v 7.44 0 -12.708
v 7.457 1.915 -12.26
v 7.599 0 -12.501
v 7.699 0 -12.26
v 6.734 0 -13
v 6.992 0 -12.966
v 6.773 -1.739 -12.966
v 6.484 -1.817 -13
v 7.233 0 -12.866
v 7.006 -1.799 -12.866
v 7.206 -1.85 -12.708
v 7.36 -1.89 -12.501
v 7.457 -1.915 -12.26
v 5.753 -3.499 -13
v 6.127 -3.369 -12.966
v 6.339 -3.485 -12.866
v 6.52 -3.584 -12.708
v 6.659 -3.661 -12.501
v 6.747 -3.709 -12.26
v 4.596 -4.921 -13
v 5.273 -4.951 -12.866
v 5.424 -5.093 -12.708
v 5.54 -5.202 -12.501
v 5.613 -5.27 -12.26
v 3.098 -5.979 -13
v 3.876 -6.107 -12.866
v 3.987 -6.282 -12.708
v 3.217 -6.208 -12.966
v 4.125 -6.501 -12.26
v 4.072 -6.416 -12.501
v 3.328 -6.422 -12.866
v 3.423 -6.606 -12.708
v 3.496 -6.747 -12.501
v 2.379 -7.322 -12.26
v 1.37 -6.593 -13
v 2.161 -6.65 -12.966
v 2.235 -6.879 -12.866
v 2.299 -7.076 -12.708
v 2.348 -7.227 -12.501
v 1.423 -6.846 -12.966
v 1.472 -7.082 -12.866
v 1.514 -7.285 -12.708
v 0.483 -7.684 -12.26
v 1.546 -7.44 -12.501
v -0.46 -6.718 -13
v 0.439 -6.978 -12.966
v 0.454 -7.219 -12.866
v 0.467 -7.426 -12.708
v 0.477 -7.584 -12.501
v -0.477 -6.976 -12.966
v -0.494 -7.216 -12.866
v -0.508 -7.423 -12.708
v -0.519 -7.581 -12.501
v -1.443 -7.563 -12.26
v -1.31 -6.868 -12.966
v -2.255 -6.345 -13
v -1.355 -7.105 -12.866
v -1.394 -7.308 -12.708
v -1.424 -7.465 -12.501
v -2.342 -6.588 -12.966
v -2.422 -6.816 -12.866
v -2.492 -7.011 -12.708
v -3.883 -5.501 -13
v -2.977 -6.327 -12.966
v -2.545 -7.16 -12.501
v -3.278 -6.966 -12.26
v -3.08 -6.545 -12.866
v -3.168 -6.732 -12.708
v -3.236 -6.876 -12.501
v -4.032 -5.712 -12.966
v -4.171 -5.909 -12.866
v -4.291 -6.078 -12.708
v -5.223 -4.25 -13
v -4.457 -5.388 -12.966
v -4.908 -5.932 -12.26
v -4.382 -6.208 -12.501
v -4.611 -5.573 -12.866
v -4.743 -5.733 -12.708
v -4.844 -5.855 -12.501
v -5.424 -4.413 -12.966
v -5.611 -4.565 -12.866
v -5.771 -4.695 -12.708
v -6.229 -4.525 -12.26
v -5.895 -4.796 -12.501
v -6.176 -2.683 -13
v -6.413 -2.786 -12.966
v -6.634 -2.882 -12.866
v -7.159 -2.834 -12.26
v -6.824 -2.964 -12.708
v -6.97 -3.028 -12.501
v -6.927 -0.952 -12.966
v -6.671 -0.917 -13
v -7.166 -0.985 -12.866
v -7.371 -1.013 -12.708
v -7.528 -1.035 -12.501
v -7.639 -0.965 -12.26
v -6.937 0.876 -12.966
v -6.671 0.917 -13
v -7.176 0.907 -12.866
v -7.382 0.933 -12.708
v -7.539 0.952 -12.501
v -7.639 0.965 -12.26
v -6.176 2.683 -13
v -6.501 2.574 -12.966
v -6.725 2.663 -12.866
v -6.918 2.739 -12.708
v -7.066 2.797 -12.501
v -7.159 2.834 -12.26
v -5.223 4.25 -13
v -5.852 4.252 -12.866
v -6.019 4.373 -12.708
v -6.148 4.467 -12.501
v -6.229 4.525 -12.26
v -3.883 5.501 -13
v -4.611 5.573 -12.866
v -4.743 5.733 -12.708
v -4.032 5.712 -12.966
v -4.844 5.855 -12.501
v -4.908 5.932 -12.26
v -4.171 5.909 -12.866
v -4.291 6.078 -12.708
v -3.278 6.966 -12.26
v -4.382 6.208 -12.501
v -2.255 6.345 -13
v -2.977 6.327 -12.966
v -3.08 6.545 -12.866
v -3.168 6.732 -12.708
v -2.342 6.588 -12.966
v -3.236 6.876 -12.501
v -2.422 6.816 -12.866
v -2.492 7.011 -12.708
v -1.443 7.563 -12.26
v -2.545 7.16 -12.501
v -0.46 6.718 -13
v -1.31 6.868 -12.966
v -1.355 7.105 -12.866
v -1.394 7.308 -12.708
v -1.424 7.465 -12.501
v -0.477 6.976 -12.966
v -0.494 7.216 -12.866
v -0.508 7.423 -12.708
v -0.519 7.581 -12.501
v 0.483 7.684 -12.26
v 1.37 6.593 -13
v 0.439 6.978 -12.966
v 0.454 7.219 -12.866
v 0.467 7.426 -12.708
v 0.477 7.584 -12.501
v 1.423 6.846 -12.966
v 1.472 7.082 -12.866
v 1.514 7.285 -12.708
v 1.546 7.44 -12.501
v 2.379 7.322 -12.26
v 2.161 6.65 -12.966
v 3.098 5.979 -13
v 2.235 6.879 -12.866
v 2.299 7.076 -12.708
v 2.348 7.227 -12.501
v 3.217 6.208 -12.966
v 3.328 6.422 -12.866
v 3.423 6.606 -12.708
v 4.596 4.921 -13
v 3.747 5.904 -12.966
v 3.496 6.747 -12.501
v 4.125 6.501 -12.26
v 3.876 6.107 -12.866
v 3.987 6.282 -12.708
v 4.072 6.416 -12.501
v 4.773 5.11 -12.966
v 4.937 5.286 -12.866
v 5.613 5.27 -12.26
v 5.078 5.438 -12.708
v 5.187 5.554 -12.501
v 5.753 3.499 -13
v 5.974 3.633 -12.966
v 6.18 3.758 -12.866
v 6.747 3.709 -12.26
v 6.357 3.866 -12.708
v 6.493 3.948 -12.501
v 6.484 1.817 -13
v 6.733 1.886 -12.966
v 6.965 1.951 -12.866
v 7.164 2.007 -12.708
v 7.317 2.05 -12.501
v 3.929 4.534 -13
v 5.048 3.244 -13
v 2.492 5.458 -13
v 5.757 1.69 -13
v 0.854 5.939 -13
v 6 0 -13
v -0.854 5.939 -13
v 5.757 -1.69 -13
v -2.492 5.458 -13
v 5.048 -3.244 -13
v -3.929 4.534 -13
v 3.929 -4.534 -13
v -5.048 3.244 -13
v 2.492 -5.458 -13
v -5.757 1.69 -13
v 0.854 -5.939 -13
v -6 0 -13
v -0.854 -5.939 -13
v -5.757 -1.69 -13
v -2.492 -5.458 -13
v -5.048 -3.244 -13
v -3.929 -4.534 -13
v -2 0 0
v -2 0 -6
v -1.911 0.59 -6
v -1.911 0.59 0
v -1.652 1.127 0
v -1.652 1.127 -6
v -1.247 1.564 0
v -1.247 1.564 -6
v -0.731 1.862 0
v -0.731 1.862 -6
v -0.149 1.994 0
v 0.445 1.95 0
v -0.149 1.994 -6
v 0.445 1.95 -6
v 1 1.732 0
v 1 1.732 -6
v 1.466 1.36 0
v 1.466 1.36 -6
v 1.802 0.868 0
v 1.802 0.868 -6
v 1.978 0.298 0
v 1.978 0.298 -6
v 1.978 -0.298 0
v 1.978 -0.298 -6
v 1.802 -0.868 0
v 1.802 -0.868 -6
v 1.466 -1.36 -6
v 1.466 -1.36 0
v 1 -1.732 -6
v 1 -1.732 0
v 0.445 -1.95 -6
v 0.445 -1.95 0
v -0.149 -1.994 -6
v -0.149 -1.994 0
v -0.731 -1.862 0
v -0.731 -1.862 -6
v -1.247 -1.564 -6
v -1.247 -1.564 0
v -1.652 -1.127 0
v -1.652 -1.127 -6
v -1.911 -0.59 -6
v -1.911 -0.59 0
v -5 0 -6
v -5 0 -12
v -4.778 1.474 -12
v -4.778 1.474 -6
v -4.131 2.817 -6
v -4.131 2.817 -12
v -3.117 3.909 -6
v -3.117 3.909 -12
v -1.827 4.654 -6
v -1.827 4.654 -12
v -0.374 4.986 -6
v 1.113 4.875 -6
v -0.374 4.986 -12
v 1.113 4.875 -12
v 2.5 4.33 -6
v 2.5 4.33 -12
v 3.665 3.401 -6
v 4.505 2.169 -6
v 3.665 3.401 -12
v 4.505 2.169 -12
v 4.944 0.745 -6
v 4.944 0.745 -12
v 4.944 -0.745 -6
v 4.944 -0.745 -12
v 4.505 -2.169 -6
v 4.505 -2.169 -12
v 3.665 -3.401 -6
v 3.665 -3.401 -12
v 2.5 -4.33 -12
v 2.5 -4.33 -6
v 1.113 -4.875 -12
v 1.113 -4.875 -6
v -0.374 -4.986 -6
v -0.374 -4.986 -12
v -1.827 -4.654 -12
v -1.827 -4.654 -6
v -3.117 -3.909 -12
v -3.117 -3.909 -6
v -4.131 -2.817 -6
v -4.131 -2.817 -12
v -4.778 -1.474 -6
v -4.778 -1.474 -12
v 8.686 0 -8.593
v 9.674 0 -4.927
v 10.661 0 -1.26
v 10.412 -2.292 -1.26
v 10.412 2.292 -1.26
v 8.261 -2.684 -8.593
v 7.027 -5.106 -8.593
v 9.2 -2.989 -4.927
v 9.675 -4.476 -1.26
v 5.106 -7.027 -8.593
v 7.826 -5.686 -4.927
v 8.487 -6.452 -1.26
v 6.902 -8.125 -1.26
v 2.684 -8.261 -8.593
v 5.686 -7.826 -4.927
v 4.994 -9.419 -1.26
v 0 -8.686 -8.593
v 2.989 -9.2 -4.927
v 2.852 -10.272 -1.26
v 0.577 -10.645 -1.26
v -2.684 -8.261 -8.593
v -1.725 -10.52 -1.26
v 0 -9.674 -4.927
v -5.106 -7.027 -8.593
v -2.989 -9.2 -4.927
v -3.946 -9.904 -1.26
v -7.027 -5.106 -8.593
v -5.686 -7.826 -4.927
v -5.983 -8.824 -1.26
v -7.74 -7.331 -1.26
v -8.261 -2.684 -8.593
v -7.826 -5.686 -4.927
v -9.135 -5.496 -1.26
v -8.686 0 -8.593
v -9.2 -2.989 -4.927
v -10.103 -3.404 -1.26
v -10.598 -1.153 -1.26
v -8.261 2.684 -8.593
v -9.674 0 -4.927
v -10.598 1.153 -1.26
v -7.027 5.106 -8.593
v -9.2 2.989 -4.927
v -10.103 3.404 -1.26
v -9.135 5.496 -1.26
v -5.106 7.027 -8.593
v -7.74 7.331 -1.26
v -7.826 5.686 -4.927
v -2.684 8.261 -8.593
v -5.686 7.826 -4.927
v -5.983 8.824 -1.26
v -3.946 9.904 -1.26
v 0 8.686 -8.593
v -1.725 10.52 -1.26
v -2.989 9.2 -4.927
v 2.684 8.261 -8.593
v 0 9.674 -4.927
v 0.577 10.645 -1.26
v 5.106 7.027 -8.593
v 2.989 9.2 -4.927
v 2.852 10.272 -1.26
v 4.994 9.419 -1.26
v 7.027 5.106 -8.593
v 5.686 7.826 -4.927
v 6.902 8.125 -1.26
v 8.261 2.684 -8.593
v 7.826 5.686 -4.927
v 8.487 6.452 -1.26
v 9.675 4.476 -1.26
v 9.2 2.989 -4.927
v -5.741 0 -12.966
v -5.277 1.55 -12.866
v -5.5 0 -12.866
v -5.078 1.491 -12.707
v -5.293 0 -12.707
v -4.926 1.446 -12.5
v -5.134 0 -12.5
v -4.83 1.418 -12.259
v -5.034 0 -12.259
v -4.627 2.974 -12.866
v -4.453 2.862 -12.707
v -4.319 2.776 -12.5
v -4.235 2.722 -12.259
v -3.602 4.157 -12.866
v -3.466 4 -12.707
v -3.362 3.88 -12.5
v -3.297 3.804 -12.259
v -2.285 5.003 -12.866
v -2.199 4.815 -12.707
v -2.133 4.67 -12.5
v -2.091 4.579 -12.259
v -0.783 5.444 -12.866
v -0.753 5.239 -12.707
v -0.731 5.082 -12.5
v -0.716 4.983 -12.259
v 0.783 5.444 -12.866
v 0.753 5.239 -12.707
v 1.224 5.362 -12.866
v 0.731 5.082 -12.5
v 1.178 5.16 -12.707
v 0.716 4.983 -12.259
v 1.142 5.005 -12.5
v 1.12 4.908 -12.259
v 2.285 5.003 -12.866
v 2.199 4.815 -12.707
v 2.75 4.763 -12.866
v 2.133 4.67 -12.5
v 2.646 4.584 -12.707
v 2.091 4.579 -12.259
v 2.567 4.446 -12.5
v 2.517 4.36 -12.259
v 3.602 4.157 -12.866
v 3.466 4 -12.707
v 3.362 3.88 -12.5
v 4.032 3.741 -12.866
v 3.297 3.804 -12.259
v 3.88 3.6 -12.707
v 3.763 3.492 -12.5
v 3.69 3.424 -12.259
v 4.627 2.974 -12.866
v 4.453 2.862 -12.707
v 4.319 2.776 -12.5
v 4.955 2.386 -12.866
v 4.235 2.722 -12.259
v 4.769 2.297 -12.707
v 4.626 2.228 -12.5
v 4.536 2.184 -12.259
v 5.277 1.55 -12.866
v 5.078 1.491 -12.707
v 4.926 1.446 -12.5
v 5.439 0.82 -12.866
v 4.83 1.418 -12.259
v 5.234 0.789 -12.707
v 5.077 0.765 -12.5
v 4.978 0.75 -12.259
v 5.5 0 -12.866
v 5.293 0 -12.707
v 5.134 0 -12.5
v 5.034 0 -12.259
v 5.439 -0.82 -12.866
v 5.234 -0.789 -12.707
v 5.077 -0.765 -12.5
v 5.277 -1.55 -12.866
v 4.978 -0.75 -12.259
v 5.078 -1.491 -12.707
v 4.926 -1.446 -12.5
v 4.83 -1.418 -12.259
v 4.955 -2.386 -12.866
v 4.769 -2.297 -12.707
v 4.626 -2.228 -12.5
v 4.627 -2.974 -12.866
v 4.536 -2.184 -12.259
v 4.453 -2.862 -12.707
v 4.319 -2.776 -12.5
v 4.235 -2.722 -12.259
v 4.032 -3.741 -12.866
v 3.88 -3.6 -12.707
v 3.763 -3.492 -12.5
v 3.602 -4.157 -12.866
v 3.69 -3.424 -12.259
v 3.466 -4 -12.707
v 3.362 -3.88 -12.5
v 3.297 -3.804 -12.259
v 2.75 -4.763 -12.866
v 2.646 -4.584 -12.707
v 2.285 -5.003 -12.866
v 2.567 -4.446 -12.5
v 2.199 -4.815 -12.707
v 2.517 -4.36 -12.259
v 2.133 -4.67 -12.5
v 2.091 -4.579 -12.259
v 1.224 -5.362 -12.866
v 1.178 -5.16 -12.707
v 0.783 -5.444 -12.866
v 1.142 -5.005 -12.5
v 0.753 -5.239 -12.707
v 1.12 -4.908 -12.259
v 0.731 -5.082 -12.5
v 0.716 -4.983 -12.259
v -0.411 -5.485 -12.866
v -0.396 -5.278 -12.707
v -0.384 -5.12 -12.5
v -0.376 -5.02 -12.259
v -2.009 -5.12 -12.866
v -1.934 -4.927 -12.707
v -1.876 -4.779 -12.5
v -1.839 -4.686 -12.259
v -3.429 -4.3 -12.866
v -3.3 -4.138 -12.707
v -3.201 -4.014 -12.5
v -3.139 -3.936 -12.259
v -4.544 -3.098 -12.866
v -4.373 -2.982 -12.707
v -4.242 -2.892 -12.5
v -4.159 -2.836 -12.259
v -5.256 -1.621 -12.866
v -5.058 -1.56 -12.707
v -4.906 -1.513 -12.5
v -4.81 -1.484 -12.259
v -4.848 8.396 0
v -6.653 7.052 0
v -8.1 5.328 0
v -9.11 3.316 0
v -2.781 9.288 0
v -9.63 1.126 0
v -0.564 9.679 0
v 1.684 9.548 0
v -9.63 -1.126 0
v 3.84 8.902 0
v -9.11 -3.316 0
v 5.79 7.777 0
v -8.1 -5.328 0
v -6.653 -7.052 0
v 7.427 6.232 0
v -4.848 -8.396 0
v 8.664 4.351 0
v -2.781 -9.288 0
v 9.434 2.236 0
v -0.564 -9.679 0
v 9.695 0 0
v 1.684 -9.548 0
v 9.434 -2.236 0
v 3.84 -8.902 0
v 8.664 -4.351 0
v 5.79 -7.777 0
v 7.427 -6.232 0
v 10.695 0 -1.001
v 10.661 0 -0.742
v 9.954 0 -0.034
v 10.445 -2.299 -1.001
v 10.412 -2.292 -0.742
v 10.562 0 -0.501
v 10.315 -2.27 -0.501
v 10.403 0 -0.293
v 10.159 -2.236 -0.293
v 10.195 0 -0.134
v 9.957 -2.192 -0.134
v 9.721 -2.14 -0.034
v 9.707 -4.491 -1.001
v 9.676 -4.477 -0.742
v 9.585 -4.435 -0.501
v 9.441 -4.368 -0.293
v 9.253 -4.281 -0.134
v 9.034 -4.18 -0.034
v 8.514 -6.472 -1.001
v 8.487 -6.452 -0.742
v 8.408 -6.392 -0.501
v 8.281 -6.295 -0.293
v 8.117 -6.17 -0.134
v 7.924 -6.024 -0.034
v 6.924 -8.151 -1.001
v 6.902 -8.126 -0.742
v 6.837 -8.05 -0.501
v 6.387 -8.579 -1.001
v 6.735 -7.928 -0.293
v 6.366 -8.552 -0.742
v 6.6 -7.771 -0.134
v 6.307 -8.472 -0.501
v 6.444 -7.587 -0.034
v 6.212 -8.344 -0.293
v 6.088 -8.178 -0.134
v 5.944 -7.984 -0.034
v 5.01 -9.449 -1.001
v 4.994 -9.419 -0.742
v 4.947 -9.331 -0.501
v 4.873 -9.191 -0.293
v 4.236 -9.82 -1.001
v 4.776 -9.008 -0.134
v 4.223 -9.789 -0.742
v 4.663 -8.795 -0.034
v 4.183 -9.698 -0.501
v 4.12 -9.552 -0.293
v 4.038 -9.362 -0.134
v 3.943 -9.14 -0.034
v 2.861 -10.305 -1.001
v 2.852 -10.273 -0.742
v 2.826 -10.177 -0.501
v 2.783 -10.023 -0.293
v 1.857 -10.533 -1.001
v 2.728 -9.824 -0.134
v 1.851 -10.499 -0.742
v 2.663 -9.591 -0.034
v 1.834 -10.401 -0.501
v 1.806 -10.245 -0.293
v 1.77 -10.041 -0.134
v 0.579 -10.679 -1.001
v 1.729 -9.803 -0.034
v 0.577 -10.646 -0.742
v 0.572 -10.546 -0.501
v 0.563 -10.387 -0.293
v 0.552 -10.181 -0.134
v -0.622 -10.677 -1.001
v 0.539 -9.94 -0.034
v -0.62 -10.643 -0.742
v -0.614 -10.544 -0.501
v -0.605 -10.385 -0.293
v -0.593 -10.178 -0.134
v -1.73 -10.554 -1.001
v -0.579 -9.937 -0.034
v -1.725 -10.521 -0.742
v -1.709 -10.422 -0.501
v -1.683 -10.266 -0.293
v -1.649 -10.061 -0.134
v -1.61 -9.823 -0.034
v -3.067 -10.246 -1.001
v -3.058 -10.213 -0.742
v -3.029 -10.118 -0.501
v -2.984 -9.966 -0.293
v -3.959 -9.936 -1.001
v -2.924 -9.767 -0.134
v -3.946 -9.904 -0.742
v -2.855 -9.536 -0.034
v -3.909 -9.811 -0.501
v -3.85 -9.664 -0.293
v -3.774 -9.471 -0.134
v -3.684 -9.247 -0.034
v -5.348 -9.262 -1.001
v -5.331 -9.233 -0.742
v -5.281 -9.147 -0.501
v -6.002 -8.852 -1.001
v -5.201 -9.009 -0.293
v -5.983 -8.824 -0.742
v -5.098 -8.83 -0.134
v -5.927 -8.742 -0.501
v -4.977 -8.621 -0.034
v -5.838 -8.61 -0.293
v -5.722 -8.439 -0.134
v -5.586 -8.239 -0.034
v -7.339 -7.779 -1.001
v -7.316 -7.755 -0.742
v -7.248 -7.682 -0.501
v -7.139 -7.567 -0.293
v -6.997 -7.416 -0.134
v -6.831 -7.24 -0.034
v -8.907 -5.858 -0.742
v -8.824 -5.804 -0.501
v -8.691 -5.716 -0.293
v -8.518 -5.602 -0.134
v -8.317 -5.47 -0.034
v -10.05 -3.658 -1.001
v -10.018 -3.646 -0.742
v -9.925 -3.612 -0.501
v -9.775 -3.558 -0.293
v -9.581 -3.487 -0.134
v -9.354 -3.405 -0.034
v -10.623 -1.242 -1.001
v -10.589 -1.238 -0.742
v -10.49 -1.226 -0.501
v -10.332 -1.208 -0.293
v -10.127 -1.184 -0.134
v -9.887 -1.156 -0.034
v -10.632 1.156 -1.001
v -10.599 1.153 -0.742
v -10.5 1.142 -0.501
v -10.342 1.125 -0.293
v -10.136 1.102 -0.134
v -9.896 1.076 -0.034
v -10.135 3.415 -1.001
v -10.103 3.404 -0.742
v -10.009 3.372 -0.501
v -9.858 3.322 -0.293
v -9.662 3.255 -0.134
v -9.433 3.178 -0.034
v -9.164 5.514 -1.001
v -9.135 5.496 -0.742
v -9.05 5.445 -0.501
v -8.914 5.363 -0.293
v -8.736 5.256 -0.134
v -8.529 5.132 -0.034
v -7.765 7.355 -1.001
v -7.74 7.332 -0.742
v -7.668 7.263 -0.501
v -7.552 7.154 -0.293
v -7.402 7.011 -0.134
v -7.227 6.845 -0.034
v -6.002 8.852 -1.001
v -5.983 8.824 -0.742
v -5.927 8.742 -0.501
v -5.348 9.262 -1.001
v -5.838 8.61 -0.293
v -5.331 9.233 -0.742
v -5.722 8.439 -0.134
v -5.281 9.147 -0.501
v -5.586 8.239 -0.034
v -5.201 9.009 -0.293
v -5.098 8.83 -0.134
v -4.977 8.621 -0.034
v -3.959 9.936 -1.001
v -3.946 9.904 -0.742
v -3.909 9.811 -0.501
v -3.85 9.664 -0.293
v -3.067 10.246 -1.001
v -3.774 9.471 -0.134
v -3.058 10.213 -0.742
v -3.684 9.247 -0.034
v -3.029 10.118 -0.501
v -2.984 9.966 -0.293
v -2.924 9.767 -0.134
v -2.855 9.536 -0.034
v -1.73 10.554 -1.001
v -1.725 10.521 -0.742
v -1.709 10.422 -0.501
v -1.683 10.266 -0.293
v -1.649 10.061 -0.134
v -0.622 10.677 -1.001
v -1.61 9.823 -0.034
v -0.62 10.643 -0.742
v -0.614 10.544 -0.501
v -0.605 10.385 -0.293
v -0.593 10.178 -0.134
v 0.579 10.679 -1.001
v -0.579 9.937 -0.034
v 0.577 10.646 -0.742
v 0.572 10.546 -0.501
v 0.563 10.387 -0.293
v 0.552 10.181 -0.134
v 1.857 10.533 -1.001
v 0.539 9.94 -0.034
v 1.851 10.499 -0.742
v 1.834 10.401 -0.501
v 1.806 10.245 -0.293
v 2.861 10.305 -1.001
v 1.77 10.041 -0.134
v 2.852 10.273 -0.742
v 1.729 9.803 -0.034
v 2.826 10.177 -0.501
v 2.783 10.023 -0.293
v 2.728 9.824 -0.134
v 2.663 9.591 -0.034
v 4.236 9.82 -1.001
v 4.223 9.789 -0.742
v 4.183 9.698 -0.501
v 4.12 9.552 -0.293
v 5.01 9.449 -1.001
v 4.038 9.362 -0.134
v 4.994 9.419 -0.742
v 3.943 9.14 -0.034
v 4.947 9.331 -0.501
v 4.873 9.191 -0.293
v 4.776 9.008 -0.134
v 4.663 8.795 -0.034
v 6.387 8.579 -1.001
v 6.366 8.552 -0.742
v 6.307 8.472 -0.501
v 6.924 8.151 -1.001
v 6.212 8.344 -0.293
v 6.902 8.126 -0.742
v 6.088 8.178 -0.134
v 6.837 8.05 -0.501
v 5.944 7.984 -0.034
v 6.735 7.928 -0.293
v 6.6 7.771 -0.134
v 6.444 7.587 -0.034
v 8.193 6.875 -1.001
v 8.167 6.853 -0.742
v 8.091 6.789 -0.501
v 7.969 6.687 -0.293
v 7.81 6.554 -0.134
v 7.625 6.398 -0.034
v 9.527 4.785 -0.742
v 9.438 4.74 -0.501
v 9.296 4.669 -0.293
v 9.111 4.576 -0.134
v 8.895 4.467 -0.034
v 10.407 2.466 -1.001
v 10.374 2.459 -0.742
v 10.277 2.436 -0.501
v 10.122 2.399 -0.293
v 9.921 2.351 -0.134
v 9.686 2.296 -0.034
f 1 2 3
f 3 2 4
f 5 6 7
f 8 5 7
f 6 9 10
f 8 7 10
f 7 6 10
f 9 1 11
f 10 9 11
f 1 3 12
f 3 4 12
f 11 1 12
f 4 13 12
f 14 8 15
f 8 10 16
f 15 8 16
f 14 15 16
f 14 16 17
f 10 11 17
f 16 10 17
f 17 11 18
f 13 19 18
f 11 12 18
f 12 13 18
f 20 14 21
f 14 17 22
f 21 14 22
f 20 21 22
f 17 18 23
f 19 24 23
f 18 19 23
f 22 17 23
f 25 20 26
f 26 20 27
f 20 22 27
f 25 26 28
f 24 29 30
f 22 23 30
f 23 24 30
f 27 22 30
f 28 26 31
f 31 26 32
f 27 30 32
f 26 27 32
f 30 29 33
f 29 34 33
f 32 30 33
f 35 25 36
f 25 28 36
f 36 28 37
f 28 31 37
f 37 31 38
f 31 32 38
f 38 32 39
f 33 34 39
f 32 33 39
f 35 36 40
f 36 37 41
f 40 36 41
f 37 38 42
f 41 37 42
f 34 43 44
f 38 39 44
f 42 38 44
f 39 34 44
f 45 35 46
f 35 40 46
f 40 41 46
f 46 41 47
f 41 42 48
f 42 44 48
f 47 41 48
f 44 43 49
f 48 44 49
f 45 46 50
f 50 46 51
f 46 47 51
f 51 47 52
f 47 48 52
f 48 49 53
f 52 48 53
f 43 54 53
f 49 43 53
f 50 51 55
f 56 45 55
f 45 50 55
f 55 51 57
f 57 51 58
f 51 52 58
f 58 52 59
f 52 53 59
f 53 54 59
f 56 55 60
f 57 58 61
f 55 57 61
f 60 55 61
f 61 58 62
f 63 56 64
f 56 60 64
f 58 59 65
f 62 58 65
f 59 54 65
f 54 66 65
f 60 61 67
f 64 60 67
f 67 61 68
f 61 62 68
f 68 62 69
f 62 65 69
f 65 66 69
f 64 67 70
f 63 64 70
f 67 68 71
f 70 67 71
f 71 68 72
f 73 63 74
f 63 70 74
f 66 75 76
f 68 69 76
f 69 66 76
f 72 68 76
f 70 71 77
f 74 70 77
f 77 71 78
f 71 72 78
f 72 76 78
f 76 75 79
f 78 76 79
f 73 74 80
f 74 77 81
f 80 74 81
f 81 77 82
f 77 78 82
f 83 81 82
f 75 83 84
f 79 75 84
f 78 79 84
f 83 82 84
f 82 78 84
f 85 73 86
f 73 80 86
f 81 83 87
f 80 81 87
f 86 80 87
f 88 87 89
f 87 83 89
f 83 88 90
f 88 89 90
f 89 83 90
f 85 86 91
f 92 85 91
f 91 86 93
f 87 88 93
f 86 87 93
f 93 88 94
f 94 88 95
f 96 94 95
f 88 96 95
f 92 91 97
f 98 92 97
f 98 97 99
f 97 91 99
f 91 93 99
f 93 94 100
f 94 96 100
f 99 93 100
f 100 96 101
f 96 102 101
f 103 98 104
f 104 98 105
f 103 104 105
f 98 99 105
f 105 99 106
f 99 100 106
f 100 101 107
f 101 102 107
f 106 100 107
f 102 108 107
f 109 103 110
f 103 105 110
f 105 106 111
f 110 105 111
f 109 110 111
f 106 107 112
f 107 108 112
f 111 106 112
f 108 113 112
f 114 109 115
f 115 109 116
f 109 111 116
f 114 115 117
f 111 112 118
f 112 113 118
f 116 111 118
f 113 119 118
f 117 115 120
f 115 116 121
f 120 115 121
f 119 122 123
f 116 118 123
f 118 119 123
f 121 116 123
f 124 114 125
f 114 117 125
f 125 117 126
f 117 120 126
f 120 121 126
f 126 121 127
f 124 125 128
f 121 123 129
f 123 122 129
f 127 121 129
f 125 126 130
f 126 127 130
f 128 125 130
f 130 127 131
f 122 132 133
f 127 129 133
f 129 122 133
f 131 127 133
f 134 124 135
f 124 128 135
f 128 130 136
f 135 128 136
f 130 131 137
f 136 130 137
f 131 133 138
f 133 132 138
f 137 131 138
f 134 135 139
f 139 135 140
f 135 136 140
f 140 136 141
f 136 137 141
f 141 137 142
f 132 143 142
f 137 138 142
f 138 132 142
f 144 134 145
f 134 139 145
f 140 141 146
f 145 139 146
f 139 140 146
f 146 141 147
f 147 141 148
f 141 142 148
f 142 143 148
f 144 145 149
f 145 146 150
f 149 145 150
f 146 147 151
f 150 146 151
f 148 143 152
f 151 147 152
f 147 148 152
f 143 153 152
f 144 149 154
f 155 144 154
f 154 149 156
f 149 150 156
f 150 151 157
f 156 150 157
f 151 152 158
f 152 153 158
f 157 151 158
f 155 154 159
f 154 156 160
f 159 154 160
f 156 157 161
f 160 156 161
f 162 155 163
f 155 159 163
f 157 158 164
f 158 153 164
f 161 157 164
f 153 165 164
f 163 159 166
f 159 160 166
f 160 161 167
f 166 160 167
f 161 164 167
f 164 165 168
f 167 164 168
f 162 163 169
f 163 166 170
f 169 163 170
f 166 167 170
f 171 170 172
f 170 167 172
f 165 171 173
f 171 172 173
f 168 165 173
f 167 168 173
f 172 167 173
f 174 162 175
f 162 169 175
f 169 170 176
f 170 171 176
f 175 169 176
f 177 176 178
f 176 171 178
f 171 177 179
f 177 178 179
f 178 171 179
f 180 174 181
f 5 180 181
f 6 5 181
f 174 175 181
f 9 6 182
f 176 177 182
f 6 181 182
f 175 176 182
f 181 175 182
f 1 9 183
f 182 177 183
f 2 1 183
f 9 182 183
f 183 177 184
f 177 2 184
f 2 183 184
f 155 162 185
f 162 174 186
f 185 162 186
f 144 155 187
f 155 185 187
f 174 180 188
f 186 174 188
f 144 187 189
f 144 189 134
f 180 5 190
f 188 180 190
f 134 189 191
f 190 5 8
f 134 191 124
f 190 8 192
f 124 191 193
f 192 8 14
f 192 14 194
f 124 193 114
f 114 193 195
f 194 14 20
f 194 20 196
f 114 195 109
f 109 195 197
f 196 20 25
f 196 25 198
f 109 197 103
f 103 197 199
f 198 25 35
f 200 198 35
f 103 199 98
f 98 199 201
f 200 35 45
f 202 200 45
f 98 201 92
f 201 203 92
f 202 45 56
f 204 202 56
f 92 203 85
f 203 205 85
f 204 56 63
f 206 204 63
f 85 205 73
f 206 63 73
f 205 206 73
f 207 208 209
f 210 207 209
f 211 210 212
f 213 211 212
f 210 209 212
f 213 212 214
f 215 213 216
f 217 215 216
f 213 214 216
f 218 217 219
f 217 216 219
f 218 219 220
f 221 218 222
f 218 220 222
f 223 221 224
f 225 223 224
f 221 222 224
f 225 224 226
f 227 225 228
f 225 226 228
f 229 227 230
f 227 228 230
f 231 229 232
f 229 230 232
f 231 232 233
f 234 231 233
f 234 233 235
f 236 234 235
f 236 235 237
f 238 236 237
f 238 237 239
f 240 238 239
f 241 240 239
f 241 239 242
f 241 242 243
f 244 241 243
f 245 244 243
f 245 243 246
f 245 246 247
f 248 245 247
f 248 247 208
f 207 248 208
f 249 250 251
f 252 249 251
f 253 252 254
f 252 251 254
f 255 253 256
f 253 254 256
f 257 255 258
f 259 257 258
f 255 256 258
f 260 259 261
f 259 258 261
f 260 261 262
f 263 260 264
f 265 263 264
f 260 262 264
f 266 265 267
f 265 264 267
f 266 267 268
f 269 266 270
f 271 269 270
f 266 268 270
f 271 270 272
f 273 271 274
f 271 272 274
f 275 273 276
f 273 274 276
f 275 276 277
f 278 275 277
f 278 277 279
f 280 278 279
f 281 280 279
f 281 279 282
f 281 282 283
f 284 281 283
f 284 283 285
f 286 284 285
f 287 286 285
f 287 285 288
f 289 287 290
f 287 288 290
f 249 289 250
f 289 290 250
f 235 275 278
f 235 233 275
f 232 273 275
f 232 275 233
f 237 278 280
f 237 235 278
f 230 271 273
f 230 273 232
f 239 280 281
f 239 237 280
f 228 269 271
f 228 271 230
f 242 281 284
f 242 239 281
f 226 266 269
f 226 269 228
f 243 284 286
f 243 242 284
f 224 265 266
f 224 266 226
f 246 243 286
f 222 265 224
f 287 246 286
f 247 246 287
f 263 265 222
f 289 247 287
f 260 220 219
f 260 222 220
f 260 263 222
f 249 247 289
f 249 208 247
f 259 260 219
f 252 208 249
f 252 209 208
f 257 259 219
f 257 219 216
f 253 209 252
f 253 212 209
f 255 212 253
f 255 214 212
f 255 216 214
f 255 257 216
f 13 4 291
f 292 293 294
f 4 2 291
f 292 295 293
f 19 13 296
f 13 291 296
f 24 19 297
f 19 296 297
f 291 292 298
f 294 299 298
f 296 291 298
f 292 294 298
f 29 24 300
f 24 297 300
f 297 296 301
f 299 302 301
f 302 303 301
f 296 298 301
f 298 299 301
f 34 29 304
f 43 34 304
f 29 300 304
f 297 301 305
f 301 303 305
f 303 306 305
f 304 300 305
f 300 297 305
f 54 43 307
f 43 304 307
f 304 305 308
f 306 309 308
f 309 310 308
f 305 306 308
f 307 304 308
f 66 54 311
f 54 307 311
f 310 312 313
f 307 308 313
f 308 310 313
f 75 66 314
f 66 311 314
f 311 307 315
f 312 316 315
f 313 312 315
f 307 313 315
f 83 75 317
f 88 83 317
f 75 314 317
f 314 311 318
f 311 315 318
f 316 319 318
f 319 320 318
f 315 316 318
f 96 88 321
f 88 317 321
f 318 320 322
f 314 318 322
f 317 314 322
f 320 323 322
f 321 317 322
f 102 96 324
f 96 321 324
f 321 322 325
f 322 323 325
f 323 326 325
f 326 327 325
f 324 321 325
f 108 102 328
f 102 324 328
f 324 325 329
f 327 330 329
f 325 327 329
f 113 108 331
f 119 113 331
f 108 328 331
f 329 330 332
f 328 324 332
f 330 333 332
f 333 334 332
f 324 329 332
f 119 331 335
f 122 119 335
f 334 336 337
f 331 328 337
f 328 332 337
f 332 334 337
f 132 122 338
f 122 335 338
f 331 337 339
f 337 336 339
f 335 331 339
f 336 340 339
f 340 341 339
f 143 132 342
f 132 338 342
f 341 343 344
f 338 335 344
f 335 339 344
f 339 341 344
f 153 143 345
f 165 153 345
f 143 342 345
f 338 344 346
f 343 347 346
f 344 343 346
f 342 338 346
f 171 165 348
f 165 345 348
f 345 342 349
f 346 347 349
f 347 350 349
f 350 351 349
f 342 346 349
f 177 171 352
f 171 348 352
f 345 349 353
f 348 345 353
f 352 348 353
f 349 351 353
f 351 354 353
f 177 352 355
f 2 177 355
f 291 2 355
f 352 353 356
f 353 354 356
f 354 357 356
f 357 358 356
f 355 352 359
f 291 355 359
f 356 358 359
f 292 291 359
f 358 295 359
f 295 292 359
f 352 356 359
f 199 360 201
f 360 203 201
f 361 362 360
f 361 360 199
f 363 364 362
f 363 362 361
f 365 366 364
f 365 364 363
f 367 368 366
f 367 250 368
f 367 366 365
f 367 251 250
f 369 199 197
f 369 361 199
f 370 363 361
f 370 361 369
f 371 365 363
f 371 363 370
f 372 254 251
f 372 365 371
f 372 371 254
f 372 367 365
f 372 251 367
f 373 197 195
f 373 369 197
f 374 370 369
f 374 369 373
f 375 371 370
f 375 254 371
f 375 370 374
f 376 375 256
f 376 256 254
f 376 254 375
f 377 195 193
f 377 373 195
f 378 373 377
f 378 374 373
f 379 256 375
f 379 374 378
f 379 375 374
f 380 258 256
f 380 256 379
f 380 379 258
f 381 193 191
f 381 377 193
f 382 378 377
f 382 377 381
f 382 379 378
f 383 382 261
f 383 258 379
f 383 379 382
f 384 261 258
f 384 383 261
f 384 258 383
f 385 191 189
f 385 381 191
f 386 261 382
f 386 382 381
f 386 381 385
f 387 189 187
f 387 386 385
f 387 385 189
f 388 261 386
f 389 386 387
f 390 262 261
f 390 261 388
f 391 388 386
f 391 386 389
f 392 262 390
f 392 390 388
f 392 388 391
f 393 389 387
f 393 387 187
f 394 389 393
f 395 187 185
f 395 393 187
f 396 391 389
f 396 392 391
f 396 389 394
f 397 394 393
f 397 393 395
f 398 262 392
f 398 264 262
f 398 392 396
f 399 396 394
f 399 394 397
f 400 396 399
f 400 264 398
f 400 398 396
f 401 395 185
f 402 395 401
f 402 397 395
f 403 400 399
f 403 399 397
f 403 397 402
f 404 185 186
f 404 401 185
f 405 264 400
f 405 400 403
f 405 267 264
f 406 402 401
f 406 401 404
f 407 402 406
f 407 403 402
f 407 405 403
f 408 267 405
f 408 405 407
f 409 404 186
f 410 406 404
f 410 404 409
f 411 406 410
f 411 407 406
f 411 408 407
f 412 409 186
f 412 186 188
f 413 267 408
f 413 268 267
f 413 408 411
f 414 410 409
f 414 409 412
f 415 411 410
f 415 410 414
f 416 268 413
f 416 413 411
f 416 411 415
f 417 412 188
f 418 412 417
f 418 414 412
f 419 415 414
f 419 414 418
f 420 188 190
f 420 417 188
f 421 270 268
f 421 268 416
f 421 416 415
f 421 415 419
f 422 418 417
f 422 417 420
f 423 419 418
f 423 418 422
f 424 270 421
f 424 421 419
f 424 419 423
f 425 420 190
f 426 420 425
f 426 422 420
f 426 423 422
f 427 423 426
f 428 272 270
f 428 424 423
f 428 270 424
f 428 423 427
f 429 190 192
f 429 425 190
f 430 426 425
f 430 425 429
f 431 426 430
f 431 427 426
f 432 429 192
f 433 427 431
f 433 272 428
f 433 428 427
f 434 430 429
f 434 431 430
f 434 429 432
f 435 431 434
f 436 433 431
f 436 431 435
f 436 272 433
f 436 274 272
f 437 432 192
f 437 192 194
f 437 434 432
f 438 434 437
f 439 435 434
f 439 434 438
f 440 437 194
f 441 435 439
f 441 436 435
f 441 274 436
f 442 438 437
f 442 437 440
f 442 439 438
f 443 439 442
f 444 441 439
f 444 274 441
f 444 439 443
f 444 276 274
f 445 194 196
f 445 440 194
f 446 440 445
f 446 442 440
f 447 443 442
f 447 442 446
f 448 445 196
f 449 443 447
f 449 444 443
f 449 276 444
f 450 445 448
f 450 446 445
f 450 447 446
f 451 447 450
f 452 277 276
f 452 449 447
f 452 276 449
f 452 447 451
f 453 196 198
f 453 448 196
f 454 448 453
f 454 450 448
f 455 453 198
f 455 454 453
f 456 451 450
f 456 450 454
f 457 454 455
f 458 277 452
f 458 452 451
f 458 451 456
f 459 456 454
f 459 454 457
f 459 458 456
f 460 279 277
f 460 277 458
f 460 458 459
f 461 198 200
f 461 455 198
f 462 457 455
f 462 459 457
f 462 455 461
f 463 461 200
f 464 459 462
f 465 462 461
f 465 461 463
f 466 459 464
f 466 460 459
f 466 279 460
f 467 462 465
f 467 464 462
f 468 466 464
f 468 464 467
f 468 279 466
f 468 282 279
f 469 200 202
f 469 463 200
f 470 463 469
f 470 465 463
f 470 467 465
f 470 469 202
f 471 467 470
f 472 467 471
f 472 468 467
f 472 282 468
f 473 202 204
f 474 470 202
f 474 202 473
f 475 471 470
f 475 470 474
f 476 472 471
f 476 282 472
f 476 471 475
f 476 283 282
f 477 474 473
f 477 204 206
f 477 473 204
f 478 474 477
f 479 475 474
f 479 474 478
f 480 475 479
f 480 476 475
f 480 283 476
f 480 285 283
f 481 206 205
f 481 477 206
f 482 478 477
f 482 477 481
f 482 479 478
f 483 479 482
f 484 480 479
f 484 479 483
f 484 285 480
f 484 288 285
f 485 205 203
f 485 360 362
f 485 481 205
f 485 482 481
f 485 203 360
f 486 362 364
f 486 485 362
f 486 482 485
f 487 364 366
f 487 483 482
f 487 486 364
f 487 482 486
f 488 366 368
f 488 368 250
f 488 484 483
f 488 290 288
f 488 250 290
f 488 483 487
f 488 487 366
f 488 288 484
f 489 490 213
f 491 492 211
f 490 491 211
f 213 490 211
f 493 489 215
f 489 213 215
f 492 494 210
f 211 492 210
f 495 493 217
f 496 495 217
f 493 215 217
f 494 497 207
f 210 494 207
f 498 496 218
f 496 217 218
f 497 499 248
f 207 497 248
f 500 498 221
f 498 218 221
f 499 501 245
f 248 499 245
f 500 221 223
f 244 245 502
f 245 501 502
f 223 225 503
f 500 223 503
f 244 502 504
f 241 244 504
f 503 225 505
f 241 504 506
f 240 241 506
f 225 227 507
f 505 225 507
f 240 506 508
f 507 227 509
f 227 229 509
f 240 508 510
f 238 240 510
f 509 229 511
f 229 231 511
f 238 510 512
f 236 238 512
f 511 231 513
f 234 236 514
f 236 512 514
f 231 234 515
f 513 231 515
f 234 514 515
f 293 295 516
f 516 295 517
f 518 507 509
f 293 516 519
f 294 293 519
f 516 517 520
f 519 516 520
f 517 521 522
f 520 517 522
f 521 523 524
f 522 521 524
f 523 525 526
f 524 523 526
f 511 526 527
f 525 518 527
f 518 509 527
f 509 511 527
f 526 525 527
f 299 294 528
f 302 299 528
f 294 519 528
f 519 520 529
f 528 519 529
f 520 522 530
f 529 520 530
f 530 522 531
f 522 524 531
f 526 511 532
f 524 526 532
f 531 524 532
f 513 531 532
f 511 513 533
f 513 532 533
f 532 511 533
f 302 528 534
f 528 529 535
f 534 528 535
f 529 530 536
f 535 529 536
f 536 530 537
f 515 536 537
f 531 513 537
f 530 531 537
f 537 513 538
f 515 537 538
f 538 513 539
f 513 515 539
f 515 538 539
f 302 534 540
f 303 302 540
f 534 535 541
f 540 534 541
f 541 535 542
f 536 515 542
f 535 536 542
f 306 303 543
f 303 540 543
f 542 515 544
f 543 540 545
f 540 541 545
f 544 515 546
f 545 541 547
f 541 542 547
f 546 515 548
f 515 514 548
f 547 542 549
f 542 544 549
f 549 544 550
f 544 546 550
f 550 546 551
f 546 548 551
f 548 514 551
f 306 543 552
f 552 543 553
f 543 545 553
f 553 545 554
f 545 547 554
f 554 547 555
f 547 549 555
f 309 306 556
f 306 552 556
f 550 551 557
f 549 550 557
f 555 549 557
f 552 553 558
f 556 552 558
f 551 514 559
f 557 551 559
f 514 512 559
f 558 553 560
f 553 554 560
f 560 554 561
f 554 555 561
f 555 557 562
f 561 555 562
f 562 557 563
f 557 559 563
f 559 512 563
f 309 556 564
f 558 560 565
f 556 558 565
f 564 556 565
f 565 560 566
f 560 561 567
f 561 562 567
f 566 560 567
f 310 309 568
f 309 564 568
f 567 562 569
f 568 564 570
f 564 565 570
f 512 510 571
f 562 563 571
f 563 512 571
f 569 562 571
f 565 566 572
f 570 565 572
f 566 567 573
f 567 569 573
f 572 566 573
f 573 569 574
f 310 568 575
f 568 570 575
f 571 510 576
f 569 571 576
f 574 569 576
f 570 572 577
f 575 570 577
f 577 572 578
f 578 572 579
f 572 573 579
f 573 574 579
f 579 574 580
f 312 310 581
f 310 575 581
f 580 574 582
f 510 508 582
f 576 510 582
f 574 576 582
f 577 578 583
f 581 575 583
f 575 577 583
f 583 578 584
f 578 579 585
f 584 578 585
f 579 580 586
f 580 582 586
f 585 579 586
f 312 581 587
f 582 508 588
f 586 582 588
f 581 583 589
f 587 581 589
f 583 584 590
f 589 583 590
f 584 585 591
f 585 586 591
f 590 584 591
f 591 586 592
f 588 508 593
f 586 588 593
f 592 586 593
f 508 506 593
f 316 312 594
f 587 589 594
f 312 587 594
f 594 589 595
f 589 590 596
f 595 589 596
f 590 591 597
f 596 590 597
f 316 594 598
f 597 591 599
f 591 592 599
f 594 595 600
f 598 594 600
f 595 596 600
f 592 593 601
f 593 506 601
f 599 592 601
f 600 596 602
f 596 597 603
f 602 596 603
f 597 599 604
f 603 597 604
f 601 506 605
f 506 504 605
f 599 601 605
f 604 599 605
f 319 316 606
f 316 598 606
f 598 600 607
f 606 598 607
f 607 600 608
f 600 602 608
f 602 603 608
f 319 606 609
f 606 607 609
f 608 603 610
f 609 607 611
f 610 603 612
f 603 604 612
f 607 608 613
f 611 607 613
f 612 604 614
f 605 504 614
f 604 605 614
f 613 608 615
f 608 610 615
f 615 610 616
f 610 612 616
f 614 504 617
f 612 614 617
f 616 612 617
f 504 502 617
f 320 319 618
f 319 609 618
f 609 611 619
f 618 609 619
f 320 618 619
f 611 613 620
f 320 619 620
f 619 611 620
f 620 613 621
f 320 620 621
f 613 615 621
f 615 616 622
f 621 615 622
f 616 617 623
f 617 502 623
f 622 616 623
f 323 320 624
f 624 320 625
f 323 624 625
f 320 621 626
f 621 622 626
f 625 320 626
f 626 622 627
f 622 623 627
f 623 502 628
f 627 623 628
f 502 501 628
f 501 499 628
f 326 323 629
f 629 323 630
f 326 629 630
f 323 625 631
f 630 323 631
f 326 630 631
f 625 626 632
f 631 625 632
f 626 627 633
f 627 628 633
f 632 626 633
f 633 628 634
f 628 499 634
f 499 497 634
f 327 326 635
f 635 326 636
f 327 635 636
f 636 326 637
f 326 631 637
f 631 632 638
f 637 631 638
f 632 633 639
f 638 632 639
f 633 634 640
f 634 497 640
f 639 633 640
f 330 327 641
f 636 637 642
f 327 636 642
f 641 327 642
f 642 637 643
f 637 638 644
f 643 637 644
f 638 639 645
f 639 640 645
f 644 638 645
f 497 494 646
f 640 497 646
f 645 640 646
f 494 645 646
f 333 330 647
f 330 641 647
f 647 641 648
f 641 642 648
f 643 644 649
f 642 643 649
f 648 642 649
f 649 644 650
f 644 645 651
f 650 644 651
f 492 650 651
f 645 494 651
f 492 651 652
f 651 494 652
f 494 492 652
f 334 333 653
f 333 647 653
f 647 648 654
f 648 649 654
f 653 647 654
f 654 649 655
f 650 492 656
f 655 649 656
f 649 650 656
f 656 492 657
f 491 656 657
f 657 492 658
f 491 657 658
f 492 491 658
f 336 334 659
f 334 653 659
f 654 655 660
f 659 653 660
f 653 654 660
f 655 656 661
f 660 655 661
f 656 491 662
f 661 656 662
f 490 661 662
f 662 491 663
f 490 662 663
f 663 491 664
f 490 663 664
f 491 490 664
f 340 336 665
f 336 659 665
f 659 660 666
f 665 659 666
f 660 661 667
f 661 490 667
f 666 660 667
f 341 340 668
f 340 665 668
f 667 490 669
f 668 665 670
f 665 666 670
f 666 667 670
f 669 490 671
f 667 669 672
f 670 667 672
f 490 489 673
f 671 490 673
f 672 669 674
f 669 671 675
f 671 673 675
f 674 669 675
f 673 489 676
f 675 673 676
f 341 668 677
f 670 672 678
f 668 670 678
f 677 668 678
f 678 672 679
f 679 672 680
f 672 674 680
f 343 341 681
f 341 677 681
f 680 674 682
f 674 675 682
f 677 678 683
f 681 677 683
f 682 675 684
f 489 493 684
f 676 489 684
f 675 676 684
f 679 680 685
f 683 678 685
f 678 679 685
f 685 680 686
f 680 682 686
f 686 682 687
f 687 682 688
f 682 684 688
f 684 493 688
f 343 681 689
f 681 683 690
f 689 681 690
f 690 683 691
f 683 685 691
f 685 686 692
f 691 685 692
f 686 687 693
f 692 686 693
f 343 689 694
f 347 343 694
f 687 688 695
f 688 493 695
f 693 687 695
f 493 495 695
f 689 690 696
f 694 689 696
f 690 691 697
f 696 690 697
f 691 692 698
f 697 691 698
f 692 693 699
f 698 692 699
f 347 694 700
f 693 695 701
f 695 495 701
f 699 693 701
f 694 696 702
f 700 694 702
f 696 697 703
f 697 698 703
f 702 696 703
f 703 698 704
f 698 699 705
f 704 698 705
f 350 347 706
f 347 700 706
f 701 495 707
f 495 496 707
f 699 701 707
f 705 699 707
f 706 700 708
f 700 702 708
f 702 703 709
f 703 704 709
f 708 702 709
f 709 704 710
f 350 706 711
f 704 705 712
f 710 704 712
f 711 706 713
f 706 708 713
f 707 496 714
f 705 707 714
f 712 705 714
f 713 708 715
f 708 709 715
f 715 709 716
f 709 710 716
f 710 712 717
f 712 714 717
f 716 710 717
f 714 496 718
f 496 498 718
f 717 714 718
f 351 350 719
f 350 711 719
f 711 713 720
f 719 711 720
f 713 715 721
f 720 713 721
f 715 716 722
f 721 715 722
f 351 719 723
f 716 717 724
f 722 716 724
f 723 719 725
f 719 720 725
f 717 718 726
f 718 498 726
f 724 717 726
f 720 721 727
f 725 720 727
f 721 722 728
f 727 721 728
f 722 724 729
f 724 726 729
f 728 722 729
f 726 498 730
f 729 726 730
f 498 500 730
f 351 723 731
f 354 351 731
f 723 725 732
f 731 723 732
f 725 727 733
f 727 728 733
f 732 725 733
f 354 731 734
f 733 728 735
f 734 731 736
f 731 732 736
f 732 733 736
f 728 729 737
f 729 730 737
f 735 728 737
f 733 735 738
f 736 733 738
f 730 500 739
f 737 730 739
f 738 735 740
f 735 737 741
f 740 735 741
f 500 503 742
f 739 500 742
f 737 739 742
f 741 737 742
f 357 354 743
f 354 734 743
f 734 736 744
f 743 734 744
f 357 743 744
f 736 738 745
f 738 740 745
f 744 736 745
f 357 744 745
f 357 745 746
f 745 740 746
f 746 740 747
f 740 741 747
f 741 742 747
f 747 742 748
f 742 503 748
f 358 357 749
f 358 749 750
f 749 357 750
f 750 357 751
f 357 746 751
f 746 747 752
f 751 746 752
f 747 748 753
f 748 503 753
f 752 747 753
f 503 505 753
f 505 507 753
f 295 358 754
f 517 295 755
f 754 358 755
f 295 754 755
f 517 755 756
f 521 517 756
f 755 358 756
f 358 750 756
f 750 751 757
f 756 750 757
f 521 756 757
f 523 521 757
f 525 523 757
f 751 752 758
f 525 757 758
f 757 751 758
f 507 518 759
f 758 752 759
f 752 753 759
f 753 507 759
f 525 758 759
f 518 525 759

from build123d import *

# Parameters (mm, degrees)
SKETCH2_R          = 5
CUT_EXTRUDE1_DEPTH = 7
SKETCH3_R          = 2
CUT_EXTRUDE2_DEPTH = 7
FILLET1_R          = 1


with BuildPart() as part:
    # Sketch1 → Revolve1 (revolve)
    with BuildSketch(Plane(origin=(0, 0, 0), x_dir=(1, 0, 0), z_dir=(0, 1, 0))):
        Polygon((0, 0), (0, 13), (7.5, 13), (11, 0), align=None)
    revolve(axis=Axis((0, 0, 0), (0, 0, -1)))

    # Sketch2 → Cut-Extrude1 (cut)
    with BuildSketch(Plane(origin=(0, 0, -13), x_dir=(-1, 0, 0), z_dir=(0, 0, -1))):
        Circle(SKETCH2_R)
    extrude(amount=-CUT_EXTRUDE1_DEPTH, mode=Mode.SUBTRACT)

    # Sketch3 → Cut-Extrude2 (cut, through all)
    with BuildSketch(Plane(origin=(0, 0, -6), x_dir=(-1, 0, 0), z_dir=(0, 0, -1))):
        Circle(SKETCH3_R)
    extrude(amount=-CUT_EXTRUDE2_DEPTH, mode=Mode.SUBTRACT)

    # Fillet1
    fillet1_edges = [part.edges().sort_by_distance(p)[0] for p in [
        (5, 0, -13),
        (-11, 0, 0),
        (-7.5, 0, -13),
    ]]
    fillet(fillet1_edges, radius=FILLET1_R)


solid = part.part
